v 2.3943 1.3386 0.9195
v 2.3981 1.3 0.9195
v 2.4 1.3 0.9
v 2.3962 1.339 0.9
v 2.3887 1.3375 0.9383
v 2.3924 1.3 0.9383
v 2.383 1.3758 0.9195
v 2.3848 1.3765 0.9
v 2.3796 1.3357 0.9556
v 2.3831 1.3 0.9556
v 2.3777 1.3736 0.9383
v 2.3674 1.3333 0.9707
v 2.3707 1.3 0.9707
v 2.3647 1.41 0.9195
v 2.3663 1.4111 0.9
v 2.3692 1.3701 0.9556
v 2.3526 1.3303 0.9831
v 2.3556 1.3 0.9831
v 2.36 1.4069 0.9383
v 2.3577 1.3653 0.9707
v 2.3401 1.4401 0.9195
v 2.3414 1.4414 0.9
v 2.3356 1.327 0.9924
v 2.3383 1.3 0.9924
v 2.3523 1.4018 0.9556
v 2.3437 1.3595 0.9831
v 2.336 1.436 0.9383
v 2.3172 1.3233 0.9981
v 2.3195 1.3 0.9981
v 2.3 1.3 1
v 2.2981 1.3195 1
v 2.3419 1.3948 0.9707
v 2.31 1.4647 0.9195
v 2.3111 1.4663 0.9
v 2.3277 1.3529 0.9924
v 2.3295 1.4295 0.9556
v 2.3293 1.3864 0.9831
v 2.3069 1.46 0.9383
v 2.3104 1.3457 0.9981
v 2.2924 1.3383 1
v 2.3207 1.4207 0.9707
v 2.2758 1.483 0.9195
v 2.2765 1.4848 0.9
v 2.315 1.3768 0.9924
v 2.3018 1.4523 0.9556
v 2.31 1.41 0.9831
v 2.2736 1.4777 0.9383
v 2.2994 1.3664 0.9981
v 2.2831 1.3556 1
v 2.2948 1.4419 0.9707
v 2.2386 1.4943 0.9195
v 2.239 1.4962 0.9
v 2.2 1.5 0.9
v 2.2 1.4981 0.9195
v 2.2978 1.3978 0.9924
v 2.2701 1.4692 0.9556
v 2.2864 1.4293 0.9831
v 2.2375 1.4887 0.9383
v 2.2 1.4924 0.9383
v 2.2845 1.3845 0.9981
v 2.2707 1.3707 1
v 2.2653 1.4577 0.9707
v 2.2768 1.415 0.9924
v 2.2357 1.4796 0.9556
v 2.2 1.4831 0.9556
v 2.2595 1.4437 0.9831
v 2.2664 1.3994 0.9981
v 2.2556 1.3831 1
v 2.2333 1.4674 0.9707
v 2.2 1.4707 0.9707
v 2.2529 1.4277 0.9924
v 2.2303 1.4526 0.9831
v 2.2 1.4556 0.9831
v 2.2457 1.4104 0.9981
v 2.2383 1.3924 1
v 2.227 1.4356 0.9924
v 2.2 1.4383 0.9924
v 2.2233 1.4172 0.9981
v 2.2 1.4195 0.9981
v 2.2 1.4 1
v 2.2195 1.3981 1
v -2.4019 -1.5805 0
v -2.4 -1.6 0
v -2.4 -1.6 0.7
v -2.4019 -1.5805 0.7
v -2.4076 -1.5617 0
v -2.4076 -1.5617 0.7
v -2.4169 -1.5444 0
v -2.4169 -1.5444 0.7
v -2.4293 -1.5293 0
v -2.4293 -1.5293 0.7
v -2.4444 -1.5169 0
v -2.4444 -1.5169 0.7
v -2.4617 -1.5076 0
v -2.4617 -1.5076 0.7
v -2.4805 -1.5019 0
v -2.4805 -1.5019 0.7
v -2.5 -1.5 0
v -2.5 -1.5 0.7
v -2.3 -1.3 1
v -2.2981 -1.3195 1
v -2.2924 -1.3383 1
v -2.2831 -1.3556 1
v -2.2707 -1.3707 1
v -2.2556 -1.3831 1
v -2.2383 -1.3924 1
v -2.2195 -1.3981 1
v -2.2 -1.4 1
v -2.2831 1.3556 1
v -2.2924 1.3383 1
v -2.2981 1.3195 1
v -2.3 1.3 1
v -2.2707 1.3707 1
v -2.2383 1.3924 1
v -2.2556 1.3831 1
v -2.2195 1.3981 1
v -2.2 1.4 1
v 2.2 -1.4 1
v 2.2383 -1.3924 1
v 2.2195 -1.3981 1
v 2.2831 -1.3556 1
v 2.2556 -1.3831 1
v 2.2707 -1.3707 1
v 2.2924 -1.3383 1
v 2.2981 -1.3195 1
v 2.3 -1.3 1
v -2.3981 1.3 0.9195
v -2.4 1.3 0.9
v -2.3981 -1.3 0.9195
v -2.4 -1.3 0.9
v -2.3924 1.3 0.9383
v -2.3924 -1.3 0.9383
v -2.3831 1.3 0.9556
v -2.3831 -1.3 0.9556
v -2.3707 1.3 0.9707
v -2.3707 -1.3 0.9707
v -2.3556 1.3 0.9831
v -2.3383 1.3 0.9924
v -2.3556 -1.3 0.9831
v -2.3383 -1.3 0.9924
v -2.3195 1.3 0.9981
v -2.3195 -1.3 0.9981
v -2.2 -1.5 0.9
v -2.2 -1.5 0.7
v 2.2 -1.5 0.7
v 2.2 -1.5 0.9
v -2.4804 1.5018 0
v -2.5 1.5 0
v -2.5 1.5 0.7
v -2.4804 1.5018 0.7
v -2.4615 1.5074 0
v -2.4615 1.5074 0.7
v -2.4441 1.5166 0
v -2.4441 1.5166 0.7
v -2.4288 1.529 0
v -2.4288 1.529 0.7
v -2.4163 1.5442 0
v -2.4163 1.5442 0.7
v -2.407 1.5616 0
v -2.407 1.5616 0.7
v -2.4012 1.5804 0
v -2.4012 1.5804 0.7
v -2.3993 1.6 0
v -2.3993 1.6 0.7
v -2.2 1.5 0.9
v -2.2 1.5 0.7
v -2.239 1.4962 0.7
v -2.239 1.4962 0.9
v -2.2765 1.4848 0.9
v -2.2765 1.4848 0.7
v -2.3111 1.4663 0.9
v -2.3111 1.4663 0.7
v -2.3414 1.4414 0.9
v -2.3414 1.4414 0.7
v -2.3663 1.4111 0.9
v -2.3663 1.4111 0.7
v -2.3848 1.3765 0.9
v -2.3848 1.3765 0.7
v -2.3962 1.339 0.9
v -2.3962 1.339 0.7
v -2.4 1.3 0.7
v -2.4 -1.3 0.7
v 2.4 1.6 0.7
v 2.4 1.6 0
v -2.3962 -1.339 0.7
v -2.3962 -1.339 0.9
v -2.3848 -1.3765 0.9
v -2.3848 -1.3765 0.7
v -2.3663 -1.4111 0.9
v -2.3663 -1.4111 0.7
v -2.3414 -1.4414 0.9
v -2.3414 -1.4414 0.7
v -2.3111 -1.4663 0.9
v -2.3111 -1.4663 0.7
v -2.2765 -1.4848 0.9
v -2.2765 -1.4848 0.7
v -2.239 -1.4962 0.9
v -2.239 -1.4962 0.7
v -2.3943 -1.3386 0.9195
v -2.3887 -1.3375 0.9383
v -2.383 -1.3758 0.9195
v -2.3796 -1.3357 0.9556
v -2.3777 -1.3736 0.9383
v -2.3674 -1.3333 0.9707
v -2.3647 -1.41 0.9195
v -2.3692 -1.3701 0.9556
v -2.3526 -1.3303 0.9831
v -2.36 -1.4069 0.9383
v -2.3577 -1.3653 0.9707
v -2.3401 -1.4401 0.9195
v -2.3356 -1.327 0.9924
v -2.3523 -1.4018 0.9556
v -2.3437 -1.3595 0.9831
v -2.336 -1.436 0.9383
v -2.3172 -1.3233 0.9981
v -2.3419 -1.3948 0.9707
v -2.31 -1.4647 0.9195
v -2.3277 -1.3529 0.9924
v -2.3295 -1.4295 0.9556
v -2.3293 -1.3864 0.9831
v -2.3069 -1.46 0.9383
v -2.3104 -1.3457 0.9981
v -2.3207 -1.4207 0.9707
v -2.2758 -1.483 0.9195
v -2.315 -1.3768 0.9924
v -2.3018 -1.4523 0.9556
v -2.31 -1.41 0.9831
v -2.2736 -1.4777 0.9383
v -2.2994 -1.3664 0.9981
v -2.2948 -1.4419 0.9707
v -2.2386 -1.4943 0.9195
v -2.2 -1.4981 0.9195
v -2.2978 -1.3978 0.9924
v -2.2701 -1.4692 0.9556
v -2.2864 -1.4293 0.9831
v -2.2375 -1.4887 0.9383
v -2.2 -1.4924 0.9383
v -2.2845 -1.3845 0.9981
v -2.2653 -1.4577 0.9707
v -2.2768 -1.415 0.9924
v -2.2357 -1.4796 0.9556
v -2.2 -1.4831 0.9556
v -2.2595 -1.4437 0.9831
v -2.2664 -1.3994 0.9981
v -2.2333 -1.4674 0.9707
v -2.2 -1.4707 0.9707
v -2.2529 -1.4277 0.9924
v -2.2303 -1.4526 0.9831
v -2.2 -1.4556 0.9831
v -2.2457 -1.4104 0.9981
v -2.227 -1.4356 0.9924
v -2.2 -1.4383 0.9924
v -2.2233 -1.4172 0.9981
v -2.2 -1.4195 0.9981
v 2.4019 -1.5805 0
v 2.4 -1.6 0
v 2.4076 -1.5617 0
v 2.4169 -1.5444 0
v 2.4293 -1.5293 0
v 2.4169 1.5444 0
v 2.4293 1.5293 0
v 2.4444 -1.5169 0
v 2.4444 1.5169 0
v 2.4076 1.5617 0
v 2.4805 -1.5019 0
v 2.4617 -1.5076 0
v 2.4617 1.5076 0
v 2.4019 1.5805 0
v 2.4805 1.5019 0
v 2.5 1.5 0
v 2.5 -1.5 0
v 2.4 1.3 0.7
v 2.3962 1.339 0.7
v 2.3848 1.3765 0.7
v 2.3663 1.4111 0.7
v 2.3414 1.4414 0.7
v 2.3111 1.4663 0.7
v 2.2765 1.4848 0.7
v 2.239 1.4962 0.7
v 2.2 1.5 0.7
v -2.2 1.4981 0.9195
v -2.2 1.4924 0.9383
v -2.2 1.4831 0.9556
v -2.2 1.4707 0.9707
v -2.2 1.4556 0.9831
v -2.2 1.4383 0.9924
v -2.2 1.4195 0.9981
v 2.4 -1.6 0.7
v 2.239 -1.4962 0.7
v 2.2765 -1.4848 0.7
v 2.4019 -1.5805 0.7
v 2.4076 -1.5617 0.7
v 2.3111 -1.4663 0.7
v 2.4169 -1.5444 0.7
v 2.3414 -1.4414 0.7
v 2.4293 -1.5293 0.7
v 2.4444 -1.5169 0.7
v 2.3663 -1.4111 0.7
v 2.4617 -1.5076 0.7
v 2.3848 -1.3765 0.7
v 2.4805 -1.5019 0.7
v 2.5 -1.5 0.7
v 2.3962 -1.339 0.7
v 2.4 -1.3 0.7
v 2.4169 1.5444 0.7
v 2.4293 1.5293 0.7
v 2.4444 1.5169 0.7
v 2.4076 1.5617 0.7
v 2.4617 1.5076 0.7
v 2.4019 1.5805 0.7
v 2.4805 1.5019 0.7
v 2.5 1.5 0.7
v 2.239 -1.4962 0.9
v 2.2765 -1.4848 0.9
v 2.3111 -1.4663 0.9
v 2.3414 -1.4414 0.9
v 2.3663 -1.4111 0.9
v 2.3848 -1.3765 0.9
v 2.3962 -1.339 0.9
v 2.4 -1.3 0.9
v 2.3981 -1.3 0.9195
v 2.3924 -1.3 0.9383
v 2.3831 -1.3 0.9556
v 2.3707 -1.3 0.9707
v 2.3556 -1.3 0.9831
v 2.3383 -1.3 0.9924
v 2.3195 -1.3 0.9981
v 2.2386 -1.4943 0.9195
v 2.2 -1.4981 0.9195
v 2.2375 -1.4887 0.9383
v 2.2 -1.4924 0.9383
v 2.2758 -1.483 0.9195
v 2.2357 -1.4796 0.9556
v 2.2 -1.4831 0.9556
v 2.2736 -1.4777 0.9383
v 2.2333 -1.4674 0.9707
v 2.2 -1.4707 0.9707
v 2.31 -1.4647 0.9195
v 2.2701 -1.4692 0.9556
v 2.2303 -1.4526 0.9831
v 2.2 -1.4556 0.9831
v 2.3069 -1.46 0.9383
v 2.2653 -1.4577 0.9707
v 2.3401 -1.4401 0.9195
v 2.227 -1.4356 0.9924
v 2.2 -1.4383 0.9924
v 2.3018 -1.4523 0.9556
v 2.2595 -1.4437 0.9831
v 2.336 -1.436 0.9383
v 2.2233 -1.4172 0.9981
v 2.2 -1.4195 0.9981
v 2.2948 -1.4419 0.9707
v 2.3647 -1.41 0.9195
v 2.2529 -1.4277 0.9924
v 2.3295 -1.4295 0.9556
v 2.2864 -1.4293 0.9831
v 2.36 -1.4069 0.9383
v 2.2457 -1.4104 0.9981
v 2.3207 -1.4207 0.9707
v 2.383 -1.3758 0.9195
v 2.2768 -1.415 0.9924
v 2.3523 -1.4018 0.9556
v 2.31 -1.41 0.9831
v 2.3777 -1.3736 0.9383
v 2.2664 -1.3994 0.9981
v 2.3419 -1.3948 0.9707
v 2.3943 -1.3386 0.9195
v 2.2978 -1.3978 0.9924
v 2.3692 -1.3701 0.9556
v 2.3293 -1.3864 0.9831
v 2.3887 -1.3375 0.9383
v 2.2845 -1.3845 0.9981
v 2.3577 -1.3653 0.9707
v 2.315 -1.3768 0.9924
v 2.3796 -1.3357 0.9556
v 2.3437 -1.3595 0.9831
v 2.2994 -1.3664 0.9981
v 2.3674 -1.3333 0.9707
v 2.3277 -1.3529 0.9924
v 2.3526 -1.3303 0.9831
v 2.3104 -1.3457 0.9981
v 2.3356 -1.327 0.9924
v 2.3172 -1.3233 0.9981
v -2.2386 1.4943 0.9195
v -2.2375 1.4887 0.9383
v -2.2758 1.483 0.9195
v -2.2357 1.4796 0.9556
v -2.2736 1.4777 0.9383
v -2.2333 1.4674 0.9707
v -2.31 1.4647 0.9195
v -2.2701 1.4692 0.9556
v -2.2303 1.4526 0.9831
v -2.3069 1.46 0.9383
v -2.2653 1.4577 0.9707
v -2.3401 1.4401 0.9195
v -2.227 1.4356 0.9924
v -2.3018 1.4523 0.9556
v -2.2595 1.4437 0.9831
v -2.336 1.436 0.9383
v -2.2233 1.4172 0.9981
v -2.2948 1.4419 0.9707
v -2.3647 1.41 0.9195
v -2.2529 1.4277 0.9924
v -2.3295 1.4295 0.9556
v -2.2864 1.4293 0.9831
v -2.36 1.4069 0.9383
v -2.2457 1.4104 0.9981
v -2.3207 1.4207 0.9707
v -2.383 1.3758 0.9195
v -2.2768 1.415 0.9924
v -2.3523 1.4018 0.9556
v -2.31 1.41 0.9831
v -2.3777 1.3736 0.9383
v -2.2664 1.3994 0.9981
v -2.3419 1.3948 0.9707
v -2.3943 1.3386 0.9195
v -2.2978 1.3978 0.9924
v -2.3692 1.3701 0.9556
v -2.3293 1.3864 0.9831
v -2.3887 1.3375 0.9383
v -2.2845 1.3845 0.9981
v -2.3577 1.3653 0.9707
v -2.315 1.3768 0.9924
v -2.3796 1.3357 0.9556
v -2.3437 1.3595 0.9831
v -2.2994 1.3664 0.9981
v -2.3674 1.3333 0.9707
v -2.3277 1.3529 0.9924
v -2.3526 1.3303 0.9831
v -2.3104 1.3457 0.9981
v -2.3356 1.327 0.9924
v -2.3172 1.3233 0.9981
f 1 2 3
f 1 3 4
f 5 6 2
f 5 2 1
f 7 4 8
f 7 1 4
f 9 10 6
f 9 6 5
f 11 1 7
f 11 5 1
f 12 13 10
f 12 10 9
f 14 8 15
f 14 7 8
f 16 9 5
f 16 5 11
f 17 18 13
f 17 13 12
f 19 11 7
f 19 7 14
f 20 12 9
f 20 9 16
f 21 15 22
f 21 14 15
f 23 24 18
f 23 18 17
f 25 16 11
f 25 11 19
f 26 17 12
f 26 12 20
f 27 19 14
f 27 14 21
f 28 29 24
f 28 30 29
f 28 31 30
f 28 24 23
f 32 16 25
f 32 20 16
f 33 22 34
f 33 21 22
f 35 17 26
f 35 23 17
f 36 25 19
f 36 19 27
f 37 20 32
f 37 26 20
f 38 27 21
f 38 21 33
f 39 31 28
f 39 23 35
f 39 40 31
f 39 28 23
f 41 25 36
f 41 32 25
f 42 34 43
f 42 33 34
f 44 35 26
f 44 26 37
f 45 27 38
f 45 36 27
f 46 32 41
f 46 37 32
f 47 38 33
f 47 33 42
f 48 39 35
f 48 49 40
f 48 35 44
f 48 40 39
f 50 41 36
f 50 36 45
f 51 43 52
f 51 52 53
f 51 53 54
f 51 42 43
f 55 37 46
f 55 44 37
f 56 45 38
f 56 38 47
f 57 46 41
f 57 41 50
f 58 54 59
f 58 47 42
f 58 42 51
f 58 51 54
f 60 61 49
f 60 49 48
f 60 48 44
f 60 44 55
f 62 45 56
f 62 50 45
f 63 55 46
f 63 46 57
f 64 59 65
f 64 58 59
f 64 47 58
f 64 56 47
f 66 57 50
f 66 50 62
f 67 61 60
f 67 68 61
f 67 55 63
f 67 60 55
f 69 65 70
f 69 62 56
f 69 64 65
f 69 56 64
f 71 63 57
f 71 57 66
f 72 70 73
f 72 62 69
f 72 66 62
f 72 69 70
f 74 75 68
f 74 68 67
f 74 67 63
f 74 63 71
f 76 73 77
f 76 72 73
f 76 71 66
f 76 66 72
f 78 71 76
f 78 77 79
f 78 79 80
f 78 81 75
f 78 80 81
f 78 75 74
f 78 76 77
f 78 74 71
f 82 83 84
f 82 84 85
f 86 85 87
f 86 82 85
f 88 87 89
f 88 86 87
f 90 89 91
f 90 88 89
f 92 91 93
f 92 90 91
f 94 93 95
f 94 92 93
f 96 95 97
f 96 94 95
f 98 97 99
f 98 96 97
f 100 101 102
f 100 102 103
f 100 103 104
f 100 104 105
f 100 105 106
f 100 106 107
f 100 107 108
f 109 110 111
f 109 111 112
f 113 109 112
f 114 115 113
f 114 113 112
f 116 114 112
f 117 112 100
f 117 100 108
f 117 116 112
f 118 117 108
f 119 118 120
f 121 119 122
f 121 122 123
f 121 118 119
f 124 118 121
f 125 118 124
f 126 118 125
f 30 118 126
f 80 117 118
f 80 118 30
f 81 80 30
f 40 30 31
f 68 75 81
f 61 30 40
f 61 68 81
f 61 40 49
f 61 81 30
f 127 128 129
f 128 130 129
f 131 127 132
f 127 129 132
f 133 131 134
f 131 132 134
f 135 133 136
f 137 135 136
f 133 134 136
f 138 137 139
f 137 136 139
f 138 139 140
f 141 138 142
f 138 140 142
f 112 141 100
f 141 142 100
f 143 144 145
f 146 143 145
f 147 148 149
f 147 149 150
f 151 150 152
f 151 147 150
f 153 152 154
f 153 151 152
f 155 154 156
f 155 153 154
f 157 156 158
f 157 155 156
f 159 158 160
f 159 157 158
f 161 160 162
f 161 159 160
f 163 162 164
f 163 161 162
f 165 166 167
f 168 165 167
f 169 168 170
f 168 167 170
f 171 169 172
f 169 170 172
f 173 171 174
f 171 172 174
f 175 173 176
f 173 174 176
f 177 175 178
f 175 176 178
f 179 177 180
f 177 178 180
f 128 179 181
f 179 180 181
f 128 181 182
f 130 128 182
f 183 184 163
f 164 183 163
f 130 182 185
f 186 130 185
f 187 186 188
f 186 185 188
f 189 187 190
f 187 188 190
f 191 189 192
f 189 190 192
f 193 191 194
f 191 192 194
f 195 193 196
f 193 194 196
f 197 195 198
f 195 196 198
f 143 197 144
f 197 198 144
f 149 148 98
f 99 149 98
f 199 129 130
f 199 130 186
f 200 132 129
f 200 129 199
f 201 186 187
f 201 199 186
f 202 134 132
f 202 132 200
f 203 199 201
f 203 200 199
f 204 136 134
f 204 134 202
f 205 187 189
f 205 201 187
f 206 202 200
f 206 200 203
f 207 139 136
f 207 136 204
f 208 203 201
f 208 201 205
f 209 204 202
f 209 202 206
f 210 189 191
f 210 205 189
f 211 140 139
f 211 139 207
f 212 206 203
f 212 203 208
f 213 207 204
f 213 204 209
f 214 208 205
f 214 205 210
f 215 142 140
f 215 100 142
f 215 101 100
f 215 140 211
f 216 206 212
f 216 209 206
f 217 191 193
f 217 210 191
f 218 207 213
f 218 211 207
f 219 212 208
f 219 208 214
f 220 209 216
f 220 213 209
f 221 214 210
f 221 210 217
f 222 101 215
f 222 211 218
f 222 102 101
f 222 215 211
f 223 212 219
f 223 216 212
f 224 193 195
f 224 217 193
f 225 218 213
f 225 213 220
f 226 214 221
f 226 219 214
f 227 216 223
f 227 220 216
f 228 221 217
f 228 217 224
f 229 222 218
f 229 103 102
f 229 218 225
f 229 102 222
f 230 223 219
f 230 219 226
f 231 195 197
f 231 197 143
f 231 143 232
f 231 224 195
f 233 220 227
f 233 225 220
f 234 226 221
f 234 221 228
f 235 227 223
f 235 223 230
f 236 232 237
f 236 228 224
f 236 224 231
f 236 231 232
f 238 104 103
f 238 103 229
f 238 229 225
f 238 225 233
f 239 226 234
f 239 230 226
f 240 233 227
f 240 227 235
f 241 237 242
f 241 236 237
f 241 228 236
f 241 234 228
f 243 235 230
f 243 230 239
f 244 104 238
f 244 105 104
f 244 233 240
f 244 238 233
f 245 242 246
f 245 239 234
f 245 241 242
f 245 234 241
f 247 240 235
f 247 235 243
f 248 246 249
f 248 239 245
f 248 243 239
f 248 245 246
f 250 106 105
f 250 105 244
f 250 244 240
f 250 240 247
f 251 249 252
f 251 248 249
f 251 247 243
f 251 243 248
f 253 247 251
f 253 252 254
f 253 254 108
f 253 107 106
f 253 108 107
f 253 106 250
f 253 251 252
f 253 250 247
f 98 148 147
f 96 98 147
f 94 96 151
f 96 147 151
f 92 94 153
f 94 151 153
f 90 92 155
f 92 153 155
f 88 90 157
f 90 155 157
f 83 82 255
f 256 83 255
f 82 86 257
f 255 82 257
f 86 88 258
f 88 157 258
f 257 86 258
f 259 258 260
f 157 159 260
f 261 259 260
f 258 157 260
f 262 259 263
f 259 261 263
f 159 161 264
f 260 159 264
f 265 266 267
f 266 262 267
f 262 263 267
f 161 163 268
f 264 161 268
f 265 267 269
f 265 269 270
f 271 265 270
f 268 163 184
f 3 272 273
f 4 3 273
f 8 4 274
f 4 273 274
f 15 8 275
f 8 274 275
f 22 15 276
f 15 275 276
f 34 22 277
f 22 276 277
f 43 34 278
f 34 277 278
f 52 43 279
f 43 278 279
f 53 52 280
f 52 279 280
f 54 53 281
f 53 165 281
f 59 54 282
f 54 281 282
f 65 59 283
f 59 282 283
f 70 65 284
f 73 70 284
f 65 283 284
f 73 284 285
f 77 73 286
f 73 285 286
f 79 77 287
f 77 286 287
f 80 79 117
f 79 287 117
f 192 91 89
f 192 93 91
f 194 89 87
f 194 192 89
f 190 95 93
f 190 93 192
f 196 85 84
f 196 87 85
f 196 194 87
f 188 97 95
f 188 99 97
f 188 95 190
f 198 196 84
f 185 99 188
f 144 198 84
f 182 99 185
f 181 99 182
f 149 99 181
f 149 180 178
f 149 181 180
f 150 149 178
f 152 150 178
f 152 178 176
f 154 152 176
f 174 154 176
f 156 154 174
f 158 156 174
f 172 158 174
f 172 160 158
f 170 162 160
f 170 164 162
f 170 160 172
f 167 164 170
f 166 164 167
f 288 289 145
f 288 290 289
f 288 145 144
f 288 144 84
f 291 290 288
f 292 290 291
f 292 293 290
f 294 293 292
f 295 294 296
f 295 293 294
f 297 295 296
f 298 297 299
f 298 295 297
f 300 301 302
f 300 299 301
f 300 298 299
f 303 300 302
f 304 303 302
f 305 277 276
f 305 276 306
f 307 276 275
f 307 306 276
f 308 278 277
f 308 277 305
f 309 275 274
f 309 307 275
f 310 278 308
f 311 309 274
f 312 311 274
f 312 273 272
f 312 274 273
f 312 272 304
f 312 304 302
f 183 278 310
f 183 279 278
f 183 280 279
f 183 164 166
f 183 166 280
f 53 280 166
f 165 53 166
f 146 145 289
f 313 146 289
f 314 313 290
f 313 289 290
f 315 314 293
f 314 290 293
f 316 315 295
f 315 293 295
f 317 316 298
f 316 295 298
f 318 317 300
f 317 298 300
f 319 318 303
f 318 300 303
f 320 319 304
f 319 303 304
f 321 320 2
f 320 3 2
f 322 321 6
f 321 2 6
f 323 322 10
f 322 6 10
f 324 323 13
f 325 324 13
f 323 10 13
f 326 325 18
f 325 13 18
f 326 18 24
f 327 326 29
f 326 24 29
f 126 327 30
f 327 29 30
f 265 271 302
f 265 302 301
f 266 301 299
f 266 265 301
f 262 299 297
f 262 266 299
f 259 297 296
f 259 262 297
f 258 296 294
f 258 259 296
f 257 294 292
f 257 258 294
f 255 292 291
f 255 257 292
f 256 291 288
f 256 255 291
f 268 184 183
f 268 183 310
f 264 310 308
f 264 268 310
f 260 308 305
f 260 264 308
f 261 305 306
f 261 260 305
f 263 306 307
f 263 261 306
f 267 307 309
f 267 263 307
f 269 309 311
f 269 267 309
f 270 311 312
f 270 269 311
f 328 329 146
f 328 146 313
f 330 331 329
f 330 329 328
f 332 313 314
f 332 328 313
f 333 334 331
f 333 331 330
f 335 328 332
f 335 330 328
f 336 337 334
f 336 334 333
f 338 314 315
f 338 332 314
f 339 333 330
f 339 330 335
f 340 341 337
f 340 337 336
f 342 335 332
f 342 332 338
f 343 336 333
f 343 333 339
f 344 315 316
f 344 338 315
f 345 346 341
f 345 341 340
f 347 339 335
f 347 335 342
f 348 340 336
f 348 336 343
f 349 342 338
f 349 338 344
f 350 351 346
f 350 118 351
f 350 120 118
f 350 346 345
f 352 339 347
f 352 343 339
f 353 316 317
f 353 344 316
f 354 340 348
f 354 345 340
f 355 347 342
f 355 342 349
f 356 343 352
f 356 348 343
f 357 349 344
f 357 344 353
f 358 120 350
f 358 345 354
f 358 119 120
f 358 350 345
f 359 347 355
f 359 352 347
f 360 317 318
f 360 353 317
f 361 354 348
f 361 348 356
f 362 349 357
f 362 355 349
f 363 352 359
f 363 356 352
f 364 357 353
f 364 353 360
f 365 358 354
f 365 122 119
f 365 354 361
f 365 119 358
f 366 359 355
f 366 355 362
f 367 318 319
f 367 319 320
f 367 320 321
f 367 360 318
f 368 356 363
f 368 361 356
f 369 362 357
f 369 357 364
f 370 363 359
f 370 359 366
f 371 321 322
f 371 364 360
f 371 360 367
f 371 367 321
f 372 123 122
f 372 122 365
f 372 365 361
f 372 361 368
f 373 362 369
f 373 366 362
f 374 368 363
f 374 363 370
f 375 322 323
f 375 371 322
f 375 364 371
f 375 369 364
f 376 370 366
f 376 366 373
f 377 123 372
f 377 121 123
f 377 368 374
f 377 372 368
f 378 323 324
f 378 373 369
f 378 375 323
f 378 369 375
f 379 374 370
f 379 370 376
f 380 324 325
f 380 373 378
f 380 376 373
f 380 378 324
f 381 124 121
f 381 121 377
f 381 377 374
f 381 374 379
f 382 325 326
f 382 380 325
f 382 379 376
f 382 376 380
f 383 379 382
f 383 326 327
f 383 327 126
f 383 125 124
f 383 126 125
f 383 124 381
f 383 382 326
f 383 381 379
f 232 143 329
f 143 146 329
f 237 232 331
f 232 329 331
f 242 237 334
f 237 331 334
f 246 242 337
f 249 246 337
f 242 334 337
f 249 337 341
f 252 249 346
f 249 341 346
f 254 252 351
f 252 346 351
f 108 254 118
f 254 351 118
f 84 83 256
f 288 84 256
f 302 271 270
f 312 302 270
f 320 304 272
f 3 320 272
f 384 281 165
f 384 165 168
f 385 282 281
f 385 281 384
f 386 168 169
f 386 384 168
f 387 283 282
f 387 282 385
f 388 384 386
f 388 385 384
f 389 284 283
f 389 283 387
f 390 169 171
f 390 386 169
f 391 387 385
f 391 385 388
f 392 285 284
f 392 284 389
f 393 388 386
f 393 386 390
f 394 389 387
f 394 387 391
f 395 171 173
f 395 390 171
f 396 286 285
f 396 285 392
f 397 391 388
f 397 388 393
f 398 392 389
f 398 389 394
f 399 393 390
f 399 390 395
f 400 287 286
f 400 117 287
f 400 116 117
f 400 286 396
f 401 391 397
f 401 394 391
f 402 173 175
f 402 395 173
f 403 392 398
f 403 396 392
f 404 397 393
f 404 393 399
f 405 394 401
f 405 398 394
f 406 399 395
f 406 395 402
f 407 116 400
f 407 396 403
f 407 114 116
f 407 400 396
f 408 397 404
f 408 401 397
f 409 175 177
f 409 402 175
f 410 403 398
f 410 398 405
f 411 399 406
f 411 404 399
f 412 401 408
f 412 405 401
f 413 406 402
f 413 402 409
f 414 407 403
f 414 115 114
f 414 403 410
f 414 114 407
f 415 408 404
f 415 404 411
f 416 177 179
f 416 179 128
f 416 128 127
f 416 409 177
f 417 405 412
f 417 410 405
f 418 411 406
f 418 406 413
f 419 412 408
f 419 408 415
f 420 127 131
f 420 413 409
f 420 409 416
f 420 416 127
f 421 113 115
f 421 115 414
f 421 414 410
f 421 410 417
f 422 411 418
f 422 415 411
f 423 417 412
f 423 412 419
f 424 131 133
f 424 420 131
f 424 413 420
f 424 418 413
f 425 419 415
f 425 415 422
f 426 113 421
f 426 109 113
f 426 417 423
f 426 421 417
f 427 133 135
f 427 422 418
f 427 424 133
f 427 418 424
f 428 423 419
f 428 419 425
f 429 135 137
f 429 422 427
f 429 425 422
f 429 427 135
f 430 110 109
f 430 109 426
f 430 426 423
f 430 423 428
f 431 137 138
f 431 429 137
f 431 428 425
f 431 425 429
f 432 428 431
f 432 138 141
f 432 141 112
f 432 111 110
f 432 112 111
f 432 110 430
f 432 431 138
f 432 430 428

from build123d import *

# Parameters (mm, degrees)
PAD_DEPTH    = 0.7
PAD001_DEPTH = 0.3
FILLET_R     = 0.1


with BuildPart() as part:
    # Sketch001 → Pad (new body)
    with BuildSketch(Plane.XY):
        with BuildLine():
            Line((-2.5, 1.500002), (-2.5, -1.5))
            ThreePointArc((-2.4, -1.6), (-2.429289, -1.529289), (-2.5, -1.5))
            Line((-2.4, -1.6), (2.4, -1.6))
            ThreePointArc((2.5, -1.5), (2.429289, -1.529289), (2.4, -1.6))
            Line((2.5, -1.5), (2.5, 1.5))
            ThreePointArc((2.4, 1.6), (2.429289, 1.529289), (2.5, 1.5))
            Line((2.4, 1.6), (-2.399296, 1.6))
            ThreePointArc((-2.5, 1.500002), (-2.428834, 1.529041), (-2.399296, 1.6))
        make_face()
    extrude(amount=PAD_DEPTH)

    # Sketch (on Face10 of Pad) → Pad001 (join)
    with BuildSketch(Plane.XY.offset(0.7)):
        with BuildLine():
            Line((-2.4, 1.3), (-2.4, -1.3))
            ThreePointArc((-2.4, -1.3), (-2.341421, -1.441421), (-2.2, -1.5))
            Line((-2.2, -1.5), (2.2, -1.5))
            ThreePointArc((2.2, -1.5), (2.341421, -1.441421), (2.4, -1.3))
            Line((2.4, -1.3), (2.4, 1.3))
            ThreePointArc((2.4, 1.3), (2.341421, 1.441421), (2.2, 1.5))
            Line((2.2, 1.5), (-2.2, 1.5))
            ThreePointArc((-2.2, 1.5), (-2.341421, 1.441421), (-2.4, 1.3))
        make_face()
    extrude(amount=PAD001_DEPTH)

    # Fillet
    fillet_edges = [part.edges().sort_by_distance(p)[0] for p in [
        (-2.4, 0, 1),
        (-2.341421, -1.441421, 1),
        (0, -1.5, 1),
        (2.341421, -1.441421, 1),
        (2.4, 0, 1),
        (2.341421, 1.441421, 1),
        (0, 1.5, 1),
        (-2.341421, 1.441421, 1),
    ]]
    fillet(fillet_edges, radius=FILLET_R)


solid = part.part
